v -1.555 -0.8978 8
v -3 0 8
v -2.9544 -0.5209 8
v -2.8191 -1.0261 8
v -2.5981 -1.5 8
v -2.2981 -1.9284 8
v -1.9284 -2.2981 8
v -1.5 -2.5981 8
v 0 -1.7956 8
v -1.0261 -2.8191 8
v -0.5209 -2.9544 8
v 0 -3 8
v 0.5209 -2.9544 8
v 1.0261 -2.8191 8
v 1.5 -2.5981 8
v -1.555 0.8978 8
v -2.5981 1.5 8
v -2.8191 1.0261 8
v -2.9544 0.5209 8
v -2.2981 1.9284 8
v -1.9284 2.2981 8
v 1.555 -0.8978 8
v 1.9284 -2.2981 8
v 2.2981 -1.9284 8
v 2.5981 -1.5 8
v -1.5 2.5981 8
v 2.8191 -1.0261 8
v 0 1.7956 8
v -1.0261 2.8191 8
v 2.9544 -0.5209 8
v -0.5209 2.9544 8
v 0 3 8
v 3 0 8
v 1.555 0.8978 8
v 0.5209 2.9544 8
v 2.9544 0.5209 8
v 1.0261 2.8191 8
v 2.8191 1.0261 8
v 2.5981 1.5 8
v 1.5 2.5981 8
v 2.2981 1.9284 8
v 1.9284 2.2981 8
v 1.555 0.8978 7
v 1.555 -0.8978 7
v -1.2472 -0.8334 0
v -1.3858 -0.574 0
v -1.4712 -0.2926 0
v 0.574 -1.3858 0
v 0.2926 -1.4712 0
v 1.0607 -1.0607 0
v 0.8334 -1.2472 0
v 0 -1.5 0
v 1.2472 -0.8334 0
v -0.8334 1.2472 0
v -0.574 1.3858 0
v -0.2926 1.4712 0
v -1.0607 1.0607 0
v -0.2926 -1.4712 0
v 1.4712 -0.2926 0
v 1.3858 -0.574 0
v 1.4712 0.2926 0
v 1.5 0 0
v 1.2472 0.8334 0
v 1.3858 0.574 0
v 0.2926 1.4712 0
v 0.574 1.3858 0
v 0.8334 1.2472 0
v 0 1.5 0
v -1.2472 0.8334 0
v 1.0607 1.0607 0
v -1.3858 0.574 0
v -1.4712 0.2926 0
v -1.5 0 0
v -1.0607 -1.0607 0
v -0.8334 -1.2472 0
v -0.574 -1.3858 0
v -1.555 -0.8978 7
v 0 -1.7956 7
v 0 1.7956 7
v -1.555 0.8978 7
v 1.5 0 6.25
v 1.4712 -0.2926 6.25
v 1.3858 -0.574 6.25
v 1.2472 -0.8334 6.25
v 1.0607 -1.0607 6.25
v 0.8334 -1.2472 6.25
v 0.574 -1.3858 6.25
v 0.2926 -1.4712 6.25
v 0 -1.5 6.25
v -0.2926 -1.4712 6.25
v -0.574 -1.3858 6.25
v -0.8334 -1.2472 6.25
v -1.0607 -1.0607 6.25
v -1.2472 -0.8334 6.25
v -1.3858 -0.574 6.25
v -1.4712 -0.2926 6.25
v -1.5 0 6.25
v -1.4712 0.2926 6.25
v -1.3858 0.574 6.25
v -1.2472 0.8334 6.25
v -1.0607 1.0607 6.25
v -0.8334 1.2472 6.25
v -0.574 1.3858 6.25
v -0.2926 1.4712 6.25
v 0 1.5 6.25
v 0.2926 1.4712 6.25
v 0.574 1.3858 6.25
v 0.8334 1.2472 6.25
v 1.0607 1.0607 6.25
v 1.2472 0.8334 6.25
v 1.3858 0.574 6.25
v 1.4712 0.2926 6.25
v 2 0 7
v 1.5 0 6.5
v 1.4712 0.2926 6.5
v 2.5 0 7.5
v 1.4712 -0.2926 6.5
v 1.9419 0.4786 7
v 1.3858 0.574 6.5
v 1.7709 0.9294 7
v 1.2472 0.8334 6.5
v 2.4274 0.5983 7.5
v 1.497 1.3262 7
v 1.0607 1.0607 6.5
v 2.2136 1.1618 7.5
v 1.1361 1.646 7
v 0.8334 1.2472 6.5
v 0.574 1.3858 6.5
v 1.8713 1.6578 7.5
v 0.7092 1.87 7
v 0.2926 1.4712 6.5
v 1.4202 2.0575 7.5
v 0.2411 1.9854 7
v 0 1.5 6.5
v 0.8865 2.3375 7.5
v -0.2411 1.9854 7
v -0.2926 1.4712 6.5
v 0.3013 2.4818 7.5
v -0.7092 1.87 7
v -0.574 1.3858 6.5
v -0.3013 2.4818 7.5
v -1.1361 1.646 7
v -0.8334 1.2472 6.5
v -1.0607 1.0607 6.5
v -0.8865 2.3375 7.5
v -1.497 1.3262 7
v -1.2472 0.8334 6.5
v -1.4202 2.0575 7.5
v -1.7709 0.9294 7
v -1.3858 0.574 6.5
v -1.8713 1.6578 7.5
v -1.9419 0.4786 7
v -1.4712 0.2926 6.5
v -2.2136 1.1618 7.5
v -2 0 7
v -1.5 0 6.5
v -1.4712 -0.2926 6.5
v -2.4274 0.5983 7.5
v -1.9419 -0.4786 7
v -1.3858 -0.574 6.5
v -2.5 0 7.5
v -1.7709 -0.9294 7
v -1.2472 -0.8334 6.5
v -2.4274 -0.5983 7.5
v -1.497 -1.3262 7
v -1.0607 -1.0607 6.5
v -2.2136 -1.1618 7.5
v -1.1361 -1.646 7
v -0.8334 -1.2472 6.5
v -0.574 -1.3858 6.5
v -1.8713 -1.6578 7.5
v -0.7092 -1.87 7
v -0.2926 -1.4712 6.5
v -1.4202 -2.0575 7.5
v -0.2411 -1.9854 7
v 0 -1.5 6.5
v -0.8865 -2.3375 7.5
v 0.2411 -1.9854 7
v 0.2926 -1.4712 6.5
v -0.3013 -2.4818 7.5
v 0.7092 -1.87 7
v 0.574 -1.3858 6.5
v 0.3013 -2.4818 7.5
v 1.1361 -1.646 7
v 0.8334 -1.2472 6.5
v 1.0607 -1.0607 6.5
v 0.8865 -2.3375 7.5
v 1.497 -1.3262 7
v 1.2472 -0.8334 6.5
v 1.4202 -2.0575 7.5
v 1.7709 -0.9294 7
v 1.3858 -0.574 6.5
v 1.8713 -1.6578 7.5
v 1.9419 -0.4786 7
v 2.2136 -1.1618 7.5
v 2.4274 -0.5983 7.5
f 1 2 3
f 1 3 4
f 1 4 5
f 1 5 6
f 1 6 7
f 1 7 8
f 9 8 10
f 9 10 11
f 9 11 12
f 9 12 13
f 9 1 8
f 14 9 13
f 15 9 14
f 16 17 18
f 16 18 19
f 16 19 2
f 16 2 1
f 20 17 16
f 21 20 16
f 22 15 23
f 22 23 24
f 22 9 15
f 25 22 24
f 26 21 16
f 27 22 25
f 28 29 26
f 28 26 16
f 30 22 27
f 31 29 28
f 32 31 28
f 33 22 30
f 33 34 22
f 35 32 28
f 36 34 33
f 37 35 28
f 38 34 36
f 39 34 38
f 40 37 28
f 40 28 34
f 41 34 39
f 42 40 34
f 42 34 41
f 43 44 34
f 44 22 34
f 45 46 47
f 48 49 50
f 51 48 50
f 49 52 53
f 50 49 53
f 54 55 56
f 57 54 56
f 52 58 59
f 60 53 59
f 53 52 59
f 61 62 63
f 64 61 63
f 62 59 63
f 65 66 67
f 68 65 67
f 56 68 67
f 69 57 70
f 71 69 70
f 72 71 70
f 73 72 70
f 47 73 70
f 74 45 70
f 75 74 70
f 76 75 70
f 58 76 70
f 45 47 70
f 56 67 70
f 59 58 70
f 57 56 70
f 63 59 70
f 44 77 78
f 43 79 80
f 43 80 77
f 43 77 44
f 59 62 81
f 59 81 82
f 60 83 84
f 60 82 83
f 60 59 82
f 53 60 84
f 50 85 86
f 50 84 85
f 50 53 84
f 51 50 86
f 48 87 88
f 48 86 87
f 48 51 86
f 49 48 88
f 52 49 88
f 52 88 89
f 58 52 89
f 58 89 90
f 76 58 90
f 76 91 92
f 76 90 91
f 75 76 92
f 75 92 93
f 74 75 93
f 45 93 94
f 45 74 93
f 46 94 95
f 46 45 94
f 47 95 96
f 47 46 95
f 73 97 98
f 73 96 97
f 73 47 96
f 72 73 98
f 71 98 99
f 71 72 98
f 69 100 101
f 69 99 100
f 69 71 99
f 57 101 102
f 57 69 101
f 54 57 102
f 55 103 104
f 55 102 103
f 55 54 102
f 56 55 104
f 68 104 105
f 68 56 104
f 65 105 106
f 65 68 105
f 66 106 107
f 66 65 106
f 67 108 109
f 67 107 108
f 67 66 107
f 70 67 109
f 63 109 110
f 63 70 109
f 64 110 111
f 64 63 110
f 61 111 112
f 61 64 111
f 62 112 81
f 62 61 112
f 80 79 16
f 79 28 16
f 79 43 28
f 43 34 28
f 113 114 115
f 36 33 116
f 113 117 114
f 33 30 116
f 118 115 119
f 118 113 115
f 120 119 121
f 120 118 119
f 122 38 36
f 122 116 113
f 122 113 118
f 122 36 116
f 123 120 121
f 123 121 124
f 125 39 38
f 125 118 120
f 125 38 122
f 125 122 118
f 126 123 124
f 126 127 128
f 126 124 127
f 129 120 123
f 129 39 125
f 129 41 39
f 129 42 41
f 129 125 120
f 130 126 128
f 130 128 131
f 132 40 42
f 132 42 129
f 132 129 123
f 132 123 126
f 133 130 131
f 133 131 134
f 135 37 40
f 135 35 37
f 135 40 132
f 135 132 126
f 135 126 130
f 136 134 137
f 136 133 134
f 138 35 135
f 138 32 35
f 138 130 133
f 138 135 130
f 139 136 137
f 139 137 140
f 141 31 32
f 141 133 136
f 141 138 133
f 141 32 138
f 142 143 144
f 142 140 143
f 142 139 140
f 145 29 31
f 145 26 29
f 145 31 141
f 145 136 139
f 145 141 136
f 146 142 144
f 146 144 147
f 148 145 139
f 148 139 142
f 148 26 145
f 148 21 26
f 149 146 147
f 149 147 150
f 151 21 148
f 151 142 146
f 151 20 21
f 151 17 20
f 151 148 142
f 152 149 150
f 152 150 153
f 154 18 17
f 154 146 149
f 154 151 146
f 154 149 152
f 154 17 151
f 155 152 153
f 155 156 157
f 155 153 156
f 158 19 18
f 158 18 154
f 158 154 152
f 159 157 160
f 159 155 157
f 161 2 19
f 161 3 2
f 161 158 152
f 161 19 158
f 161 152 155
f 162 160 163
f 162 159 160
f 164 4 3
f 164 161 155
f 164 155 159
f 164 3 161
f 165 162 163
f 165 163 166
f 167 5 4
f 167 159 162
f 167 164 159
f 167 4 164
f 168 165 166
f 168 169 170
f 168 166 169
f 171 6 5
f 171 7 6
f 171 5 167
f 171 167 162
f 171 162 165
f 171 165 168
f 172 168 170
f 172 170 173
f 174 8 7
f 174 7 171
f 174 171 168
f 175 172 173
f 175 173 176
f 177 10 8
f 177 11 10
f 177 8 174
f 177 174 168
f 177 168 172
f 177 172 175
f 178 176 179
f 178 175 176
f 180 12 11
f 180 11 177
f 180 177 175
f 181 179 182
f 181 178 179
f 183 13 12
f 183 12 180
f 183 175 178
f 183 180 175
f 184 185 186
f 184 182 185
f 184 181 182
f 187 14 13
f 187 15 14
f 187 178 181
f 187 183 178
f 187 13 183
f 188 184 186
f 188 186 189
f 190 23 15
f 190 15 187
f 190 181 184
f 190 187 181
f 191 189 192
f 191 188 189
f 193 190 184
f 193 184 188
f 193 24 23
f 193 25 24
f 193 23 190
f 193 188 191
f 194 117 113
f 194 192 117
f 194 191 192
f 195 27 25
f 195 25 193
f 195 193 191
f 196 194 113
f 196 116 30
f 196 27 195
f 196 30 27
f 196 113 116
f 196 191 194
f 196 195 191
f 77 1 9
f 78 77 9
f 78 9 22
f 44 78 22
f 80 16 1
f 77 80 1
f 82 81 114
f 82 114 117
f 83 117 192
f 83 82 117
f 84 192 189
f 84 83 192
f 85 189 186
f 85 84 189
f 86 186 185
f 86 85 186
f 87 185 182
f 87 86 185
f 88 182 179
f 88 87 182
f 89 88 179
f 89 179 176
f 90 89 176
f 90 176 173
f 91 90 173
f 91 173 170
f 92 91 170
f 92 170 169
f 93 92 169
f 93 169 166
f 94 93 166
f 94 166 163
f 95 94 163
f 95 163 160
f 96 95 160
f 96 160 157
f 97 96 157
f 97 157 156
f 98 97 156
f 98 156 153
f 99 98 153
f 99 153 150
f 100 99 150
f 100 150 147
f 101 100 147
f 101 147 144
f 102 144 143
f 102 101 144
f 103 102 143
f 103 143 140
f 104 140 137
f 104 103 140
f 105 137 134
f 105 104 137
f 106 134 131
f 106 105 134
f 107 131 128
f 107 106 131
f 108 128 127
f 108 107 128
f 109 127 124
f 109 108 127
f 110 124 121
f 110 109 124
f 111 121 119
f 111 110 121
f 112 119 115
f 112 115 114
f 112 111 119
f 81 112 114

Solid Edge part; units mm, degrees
sketch "Sketch1" plane through (0, 0, 0) normal (0, 0, 1) x (1, 0, 0)
  circle A0 centre (0, 0) radius 1.5
extrude "Protrusion1" add sketch "Sketch1" along normal blind 6.25
sketch "Sketch2" plane through (0, 0, 6.25) normal (0, 0, 1) x (1, 0, 0)
  circle A0 centre (0, 0) radius 3
extrude "ExtrudedProtrusion_2" add sketch "Sketch2" along normal blind 1.75
chamfer "Chamfer_1" distance 1.75 angle 45 1 edges at (-3, 0, 6.25)
sketch "Sketch3" plane through (0, 0, 8) normal (0, 0, 1) x (0, 1, 0)
  line L0 (0.8978, -1.555) -> (1.7956, 0)
  line L1 (1.7956, 0) -> (0.8978, 1.555)
  line L2 (0.8978, 1.555) -> (-0.8978, 1.555)
  line L3 (-0.8978, 1.555) -> (-1.7956, 0)
  line L4 (-1.7956, 0) -> (-0.8978, -1.555)
  line L5 (-0.8978, -1.555) -> (0.8978, -1.555)
extrude "ExtrudedCutout_1" cut sketch "Sketch3" against normal blind 1
properties material "Iron, grey cast type 20"
